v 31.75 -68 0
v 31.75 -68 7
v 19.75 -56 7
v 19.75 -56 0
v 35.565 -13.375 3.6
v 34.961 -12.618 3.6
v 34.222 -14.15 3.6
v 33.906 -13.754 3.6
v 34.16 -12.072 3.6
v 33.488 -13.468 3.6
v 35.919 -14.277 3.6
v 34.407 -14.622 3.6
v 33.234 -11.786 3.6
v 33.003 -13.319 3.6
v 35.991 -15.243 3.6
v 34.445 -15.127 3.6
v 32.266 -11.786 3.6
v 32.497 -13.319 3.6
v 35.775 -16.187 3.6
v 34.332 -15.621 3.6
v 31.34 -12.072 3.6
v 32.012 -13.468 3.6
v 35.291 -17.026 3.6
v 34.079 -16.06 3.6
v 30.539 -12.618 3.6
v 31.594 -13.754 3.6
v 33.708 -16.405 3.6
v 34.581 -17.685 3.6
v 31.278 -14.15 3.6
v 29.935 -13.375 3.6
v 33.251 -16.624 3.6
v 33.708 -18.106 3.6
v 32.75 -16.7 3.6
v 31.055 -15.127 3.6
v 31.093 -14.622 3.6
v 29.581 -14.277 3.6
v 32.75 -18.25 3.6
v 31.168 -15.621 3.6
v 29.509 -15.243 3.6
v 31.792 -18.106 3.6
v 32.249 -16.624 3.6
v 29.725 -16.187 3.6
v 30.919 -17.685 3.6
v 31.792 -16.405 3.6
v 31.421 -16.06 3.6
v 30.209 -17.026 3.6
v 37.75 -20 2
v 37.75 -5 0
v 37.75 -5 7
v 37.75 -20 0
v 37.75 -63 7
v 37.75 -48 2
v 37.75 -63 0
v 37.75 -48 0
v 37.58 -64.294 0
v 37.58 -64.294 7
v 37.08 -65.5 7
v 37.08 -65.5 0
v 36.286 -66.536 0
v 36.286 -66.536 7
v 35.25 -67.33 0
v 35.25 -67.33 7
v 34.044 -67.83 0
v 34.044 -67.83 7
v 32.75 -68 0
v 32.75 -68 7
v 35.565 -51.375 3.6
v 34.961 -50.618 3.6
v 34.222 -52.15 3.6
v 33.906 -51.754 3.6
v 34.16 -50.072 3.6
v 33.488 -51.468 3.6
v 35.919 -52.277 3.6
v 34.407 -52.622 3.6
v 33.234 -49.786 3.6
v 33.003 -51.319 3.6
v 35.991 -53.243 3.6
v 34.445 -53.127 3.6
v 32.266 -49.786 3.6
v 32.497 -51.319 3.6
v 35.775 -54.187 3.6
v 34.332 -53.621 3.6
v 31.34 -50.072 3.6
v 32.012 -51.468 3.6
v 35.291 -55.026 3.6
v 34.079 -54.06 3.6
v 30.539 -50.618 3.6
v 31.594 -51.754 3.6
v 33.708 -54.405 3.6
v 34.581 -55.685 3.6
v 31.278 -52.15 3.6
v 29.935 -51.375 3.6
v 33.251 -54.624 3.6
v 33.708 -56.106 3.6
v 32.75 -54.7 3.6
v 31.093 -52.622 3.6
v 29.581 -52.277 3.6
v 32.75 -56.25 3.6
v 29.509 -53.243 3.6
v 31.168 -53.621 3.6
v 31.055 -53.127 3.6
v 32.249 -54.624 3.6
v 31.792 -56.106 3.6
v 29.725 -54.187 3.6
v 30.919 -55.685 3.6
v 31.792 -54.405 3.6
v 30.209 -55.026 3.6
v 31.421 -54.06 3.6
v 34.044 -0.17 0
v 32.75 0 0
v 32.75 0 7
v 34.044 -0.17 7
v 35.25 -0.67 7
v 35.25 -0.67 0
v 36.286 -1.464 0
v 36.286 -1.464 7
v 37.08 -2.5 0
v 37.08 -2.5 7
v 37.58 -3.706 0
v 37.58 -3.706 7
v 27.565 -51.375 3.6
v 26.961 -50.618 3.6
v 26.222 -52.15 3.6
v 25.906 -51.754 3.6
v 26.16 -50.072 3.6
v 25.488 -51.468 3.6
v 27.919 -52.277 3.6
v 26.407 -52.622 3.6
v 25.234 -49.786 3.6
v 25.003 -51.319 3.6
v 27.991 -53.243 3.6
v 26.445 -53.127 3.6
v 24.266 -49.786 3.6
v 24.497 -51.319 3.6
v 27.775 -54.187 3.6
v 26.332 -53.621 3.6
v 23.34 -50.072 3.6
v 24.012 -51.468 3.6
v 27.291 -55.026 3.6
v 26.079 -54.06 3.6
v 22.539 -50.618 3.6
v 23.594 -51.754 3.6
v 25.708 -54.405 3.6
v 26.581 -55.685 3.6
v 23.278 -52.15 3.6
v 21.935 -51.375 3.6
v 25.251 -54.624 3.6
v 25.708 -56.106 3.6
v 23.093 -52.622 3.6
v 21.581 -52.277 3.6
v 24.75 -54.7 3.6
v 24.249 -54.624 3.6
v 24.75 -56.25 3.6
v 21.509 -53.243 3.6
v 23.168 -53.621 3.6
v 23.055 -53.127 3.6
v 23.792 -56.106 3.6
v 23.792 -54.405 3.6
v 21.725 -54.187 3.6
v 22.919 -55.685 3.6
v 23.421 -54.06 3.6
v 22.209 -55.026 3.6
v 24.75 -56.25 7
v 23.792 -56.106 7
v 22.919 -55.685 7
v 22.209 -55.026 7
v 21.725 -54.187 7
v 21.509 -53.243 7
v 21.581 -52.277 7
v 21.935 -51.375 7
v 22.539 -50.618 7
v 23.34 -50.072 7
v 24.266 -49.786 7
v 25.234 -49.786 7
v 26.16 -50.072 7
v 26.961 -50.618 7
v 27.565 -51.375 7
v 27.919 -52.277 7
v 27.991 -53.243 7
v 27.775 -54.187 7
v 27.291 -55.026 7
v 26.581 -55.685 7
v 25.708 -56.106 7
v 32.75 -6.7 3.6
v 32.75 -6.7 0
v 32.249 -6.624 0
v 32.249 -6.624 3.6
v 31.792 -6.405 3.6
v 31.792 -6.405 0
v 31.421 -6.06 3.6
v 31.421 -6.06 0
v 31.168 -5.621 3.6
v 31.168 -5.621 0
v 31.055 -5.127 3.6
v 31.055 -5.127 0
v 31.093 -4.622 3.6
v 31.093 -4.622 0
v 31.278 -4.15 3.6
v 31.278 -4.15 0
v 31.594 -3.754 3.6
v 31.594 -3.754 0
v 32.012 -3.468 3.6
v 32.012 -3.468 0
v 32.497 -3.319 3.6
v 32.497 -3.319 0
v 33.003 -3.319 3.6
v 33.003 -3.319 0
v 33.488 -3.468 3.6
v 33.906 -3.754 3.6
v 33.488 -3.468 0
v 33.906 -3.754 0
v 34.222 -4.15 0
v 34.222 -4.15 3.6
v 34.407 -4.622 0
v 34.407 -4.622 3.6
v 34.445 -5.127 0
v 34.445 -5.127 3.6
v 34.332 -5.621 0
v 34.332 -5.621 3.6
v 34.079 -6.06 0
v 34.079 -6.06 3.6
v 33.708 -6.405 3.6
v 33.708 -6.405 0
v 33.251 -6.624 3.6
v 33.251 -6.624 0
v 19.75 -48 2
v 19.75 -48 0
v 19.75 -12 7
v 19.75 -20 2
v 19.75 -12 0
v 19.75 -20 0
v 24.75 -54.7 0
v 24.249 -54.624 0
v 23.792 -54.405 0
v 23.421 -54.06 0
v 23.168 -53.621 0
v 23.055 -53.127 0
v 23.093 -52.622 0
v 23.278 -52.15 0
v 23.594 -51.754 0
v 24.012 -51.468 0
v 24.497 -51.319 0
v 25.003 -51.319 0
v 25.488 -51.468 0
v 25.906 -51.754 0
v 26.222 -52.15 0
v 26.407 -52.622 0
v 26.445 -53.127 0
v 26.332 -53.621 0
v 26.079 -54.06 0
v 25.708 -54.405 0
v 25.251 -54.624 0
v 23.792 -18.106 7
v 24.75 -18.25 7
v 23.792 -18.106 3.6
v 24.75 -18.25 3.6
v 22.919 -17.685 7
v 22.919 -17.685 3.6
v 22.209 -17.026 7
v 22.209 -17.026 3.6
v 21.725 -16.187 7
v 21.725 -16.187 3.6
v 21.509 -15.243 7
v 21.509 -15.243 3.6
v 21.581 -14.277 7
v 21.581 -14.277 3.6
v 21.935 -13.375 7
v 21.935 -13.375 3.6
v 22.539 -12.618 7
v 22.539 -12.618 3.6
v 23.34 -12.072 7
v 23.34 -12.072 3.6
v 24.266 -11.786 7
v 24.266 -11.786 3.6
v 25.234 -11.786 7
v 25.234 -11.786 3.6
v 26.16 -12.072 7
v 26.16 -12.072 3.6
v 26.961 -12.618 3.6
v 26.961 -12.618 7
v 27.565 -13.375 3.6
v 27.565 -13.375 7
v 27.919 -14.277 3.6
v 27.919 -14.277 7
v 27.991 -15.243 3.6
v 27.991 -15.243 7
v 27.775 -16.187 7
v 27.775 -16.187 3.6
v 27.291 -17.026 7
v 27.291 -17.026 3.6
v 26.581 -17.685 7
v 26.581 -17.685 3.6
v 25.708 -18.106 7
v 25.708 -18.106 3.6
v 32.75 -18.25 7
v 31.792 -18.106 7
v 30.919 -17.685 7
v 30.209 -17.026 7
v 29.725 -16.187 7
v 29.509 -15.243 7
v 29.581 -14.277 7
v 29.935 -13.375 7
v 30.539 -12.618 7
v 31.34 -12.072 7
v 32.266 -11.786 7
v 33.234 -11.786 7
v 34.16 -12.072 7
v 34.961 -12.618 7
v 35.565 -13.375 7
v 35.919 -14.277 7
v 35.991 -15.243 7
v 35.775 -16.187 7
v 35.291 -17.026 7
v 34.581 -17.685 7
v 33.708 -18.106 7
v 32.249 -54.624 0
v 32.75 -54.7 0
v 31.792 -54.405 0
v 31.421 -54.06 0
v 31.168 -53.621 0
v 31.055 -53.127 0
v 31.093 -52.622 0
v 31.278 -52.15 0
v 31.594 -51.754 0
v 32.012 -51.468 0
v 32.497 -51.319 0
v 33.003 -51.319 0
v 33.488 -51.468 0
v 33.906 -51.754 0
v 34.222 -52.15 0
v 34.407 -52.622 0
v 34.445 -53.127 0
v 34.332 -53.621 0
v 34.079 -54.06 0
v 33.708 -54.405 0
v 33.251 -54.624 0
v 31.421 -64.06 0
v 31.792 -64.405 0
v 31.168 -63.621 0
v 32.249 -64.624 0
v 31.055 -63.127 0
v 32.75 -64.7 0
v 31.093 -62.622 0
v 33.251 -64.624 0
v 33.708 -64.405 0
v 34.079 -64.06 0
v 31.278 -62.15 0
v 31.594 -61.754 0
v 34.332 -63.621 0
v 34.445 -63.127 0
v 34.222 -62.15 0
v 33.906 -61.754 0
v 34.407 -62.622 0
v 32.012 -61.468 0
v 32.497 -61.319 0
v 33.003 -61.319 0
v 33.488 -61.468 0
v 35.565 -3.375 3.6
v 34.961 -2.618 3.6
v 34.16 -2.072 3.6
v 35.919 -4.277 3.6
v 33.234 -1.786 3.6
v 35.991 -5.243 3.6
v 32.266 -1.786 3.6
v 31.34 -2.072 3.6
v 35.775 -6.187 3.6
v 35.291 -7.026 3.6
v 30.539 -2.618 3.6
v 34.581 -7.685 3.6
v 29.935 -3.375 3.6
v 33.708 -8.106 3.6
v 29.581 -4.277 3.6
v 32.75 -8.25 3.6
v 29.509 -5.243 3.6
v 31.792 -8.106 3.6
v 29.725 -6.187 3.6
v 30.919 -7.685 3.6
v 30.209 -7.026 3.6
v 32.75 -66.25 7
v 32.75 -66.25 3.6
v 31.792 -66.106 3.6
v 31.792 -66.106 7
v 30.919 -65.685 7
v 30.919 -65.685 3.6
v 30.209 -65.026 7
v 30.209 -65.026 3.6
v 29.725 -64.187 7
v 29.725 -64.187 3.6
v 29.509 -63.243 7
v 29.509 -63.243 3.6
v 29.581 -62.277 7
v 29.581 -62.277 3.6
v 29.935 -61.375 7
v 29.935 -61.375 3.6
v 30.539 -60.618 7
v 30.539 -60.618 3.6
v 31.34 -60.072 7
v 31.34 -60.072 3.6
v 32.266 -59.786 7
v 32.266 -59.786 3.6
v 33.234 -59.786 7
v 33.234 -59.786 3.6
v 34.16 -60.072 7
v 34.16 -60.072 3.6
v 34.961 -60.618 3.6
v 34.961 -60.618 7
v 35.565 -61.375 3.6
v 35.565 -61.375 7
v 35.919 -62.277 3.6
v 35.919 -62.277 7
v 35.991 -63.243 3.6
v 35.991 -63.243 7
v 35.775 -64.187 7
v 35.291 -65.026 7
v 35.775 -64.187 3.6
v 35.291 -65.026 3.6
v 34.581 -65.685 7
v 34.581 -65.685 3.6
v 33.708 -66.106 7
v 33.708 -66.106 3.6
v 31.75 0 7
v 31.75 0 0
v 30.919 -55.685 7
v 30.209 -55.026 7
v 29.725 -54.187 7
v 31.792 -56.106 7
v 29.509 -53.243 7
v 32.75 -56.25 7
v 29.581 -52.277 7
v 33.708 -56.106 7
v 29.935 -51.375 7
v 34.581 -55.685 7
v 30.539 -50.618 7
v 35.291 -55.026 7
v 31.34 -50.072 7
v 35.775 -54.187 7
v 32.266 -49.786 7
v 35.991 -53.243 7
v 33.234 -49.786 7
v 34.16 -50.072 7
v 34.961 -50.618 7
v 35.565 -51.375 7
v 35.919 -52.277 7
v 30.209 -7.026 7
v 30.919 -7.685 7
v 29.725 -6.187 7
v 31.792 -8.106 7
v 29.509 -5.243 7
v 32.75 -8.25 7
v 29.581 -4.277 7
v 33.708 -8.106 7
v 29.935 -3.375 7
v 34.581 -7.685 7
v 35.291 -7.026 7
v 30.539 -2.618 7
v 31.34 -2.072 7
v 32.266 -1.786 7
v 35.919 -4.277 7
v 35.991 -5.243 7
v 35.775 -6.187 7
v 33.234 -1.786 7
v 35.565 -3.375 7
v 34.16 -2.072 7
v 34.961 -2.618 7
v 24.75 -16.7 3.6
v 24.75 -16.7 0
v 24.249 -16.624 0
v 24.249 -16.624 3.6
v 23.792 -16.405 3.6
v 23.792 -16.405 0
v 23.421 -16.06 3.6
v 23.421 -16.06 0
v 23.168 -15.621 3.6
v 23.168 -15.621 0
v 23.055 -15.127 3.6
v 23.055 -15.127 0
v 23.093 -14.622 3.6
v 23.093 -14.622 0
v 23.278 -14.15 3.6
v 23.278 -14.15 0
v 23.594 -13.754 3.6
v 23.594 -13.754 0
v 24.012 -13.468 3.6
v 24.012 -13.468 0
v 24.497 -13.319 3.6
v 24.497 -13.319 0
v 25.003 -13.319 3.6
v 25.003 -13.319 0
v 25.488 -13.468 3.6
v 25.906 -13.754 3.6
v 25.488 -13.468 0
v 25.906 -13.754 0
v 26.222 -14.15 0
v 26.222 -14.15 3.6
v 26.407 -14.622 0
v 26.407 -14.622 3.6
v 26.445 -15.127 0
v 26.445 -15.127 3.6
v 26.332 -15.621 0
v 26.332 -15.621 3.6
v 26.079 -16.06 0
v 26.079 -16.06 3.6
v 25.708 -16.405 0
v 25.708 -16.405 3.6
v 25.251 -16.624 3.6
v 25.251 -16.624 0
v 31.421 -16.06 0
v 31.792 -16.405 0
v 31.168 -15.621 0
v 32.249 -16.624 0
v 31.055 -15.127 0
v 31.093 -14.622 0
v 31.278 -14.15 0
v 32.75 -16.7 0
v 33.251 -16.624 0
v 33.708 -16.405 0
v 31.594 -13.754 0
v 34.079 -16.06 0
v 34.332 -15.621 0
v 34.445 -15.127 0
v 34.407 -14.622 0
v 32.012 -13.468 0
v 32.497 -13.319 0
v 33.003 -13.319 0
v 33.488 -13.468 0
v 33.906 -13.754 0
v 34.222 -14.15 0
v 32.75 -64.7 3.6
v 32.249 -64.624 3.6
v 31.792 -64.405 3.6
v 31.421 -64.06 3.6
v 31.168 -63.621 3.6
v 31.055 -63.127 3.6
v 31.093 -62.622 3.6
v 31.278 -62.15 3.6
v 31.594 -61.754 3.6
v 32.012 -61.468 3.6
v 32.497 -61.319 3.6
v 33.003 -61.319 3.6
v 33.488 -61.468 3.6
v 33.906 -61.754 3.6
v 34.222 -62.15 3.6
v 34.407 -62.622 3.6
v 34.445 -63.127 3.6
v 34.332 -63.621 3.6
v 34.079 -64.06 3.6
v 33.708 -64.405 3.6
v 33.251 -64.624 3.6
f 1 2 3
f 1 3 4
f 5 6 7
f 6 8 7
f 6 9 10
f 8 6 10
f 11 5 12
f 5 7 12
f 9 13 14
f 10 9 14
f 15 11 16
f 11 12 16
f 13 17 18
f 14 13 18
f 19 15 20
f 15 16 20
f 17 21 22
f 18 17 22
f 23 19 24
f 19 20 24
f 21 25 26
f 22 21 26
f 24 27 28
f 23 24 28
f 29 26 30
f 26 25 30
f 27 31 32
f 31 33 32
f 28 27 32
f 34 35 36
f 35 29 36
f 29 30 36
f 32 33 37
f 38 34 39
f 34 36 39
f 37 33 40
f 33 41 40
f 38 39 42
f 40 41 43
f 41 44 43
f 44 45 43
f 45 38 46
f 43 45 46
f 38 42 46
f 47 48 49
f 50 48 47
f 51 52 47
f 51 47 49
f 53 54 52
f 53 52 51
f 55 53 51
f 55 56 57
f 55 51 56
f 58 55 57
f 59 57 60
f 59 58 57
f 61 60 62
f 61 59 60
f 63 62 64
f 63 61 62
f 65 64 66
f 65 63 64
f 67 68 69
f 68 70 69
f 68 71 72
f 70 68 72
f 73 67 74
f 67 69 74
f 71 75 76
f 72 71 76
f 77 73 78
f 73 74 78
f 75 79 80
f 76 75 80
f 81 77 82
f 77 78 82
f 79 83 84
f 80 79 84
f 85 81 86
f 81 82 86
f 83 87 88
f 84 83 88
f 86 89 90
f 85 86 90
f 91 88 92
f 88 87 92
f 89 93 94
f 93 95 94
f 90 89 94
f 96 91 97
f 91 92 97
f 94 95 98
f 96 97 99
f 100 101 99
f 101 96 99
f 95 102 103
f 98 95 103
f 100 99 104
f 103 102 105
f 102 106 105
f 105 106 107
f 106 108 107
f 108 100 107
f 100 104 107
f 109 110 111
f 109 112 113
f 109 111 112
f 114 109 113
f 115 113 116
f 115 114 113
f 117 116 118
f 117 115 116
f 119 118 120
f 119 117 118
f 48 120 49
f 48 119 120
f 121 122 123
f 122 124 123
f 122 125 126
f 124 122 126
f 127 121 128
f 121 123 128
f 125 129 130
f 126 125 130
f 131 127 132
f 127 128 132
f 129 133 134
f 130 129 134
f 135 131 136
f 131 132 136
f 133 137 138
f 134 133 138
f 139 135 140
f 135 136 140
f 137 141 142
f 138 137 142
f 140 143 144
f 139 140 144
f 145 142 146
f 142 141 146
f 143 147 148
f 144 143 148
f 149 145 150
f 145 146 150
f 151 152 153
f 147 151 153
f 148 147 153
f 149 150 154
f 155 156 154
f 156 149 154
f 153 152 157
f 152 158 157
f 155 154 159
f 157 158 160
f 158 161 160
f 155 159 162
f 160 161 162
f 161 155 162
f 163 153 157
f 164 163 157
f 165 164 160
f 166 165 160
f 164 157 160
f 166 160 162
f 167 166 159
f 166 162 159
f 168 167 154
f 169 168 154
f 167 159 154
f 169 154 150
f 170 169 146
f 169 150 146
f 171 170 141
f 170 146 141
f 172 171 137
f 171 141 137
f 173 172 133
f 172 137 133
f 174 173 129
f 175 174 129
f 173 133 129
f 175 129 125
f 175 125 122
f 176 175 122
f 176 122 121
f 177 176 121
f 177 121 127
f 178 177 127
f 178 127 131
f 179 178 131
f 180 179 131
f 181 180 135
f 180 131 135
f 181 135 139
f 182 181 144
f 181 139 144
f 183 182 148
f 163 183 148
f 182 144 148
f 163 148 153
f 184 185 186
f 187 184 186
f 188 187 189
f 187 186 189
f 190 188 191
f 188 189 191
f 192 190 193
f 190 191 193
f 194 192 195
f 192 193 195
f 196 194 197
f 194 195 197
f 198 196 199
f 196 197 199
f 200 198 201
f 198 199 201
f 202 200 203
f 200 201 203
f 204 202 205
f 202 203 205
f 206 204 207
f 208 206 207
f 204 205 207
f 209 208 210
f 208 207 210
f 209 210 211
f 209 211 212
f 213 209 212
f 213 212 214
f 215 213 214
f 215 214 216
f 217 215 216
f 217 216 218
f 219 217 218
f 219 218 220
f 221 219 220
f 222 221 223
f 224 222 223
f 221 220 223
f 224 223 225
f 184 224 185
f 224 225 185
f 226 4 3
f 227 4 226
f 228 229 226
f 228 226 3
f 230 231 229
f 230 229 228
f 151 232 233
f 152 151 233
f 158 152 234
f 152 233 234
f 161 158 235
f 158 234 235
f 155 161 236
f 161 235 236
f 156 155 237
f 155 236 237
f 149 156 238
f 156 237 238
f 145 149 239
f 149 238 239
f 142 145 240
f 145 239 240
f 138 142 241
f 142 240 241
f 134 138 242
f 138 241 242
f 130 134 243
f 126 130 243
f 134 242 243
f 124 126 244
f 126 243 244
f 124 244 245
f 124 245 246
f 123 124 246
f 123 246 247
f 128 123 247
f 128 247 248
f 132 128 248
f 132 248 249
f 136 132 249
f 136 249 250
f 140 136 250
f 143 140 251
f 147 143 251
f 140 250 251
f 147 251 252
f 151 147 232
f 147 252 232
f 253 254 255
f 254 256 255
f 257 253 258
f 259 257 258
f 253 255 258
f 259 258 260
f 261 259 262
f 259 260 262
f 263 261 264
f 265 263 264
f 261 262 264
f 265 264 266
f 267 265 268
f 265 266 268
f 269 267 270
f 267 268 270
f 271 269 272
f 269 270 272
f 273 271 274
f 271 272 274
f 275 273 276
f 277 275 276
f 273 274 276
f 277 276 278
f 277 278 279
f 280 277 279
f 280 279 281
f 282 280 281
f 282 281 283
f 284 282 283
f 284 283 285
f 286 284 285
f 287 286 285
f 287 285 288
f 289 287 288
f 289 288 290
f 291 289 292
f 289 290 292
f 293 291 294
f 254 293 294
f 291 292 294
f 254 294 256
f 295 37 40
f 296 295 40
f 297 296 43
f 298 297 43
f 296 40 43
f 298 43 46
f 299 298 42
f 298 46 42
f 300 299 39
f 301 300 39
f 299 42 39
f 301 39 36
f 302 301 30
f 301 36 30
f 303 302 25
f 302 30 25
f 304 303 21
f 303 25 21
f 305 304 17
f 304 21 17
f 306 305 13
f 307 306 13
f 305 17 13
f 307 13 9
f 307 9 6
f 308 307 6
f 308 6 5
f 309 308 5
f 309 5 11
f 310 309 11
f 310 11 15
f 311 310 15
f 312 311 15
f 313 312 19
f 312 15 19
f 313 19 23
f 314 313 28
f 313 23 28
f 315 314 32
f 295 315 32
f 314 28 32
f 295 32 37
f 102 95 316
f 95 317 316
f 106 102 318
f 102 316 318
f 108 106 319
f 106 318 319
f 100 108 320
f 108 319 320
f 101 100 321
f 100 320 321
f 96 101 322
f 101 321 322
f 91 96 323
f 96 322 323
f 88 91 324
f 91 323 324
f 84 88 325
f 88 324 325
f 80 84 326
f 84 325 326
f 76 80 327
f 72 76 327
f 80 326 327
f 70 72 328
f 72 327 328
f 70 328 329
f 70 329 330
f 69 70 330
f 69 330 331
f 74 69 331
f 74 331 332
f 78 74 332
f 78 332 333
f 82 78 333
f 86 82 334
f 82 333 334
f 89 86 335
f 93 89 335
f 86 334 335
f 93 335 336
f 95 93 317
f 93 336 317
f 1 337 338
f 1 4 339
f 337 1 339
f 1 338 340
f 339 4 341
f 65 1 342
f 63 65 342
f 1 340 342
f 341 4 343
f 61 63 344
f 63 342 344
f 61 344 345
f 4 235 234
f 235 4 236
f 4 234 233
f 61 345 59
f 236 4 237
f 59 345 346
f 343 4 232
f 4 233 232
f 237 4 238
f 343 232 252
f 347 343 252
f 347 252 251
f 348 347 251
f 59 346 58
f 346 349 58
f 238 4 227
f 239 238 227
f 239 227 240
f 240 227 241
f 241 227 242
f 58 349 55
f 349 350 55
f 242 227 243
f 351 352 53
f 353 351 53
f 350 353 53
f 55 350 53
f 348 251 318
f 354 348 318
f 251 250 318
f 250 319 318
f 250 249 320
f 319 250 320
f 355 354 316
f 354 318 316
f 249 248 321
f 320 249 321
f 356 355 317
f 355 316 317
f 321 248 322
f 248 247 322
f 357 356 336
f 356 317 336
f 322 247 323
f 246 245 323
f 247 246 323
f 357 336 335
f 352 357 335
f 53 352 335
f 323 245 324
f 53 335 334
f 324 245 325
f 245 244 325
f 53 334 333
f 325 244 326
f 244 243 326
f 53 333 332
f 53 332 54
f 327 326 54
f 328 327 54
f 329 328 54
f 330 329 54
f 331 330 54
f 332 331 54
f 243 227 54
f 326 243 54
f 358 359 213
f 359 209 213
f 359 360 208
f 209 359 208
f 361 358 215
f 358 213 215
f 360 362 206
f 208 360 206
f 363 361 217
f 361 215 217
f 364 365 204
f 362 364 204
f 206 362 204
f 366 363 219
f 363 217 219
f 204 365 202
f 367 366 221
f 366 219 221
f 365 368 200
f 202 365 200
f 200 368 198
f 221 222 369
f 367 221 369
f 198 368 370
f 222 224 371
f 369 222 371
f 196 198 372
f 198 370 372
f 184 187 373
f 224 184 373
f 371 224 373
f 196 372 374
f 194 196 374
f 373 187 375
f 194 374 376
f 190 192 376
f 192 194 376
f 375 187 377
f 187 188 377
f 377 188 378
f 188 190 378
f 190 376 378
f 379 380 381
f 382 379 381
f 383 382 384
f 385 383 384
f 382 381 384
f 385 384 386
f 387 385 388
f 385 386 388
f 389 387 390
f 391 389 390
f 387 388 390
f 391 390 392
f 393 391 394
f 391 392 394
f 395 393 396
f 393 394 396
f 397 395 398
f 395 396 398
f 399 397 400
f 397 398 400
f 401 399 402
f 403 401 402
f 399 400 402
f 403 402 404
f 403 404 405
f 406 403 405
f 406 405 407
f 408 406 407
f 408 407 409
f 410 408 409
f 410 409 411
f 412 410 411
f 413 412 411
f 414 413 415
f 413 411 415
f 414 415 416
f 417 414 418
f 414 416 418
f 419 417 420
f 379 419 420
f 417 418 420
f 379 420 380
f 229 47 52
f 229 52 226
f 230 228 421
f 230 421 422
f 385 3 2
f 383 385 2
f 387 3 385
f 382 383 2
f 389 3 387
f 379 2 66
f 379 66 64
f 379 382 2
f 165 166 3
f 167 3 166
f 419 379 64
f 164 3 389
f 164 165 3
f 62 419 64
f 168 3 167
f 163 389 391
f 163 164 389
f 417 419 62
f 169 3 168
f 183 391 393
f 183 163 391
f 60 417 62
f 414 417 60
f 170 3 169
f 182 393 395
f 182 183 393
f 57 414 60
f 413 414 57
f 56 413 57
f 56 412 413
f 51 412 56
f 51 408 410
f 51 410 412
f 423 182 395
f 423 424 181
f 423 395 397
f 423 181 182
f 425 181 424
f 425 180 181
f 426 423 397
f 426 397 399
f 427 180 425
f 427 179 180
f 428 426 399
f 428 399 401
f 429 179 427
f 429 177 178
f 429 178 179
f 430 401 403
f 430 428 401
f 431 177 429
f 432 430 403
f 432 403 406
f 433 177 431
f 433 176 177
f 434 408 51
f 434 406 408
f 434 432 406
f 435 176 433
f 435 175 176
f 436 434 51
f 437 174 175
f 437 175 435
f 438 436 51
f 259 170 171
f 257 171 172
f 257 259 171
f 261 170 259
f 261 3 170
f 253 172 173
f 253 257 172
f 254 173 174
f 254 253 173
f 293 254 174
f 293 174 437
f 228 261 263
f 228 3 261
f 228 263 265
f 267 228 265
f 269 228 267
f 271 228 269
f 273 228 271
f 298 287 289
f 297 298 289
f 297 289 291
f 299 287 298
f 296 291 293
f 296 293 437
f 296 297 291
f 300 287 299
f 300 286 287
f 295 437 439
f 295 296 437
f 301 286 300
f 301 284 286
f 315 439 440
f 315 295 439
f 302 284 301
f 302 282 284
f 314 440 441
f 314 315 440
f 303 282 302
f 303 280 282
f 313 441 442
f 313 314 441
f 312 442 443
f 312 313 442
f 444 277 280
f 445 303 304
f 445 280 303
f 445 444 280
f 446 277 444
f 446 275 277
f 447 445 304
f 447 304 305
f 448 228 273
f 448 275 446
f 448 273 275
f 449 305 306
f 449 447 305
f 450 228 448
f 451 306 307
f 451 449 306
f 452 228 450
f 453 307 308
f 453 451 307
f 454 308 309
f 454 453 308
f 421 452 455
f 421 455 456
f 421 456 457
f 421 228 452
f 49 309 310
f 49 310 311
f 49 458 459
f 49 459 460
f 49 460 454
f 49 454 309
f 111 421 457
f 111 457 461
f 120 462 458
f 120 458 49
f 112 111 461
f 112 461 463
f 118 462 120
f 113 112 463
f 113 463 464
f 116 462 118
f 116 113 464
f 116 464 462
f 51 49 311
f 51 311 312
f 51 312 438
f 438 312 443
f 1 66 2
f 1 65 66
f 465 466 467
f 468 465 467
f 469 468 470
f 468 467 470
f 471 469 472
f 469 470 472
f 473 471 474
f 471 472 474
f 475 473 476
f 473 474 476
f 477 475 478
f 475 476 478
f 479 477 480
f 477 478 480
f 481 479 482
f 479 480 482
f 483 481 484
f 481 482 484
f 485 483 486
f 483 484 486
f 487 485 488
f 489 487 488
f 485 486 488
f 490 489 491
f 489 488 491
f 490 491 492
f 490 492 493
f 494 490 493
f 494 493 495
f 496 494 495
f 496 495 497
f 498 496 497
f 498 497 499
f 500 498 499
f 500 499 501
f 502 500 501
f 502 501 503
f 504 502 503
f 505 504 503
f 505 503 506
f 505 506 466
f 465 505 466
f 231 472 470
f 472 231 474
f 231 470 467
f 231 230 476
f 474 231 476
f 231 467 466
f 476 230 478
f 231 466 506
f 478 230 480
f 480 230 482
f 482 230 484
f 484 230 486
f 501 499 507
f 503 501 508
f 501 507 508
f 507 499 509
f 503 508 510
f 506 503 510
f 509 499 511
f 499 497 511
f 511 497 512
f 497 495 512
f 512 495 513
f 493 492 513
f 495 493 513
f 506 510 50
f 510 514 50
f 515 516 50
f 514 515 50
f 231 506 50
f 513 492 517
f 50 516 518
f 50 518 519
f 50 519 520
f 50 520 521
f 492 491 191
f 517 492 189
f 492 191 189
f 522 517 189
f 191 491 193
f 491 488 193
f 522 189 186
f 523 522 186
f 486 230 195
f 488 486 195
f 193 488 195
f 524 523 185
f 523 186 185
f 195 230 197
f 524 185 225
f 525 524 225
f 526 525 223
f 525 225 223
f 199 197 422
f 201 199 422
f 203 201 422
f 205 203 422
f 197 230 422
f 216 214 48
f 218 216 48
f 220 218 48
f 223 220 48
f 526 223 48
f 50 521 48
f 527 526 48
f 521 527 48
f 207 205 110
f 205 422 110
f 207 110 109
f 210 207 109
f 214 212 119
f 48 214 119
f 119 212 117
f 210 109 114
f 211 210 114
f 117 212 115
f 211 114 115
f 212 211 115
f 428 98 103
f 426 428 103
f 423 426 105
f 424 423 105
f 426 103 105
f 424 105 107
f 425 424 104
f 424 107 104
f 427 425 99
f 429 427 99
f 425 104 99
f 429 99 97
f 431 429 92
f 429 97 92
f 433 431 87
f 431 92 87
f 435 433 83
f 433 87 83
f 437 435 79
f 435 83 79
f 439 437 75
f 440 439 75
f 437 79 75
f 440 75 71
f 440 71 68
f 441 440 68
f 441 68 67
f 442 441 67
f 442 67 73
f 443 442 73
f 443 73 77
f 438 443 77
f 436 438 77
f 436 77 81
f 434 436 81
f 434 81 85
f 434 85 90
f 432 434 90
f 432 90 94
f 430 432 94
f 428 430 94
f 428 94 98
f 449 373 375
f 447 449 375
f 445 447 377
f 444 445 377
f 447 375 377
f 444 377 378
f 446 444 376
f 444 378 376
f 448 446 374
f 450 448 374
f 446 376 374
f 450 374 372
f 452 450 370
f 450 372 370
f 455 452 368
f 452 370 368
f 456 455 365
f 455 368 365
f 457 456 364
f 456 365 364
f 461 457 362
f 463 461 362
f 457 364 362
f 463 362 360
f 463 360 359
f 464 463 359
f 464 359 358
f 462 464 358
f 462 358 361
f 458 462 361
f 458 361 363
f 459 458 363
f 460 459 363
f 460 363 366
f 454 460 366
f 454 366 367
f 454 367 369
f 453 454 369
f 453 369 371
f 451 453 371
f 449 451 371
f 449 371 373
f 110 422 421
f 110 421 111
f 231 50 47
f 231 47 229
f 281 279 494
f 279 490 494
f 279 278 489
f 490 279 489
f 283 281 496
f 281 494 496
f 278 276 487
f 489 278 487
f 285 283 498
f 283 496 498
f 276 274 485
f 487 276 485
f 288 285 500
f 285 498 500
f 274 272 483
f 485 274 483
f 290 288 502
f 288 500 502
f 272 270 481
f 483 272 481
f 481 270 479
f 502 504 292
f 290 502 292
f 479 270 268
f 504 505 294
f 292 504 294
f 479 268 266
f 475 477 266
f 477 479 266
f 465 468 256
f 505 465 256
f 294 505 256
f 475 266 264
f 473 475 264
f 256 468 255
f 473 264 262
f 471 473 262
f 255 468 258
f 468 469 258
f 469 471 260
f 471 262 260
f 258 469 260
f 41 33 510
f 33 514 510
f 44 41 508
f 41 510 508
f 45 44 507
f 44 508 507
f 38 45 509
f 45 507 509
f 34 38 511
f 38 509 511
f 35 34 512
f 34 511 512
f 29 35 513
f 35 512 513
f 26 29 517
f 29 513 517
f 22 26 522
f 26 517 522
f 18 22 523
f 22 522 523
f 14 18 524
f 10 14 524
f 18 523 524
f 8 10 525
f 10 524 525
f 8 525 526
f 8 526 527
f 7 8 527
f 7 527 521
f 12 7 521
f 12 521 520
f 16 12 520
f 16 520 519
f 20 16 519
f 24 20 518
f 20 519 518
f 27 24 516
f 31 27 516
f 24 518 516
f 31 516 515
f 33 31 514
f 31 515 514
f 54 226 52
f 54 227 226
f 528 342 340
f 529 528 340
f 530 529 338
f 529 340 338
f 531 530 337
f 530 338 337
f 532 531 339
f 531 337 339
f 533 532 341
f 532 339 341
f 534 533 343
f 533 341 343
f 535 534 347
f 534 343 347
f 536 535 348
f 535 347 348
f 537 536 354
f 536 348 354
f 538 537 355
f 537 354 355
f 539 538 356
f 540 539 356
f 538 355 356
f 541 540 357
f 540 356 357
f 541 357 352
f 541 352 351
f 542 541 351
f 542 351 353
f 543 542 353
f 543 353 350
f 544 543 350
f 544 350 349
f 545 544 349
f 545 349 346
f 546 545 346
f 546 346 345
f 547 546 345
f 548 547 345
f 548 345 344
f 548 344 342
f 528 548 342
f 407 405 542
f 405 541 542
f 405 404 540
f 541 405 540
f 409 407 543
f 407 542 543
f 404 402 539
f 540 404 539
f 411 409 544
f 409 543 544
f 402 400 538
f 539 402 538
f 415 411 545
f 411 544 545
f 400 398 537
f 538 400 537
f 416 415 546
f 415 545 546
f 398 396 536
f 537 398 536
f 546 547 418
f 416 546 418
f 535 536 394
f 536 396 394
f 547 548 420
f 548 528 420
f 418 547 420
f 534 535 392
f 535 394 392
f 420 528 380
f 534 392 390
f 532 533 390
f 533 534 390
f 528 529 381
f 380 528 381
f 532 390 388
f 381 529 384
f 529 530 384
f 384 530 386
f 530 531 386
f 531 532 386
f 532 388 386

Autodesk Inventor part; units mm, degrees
ref_plane "YZ Plane" through (0, 0, 0) normal (1, 0, 0) x (0, 1, 0)
ref_plane "XZ Plane" through (0, 0, 0) normal (0, 1, 0) x (-1, 0, 0)
ref_plane "XY Plane" through (0, 0, 0) normal (0, 0, 1) x (1, 0, 0)
ref_plane "Work Plane1" through (0, 0, 0) normal (0, 0, 1) x (1, 0, 0)
sketch "Sketch1" plane through (0, 0, 0) normal (0, 0, 1) x (1, 0, 0)
  line L0 (-32.75, 0) -> (32.75, 0) projected
  arc A0 (37.75, -5) -> (32.75, 0) centre (32.75, -5) ccw projected
  line L1 (37.75, -5) -> (37.75, -15) projected
  line L2 (-37.75, -20) -> (77.75, -20) construction
  line L3 (0.95, -48) -> (37.75, -48) construction
  arc A1 (32.75, -68) -> (37.75, -63) centre (32.75, -63) ccw projected
  line L4 (37.75, -63) -> (37.75, -48) projected
  line L5 (26.6, -68) -> (32.75, -68) projected
  line L6 (19.75, 0) -> (37.75, 0)
  line L7 (37.75, 0) -> (37.75, -68)
  line L8 (37.75, -68) -> (19.75, -68)
  line L9 (19.75, -68) -> (19.75, 0)
  point P0 (0, 0)
  point P1 (24.75, -5)
  point P2 (24.75, -63)
  dimension "d0" = 18
  dimension "d1" = 5
  dimension "d2" = 5
  dimension "d3" = 5
extrude "Extrusion1" add sketch "Sketch1" along normal blind 7 contours L0 A0 L1 L7 L4 A1 L5 L8 L9
sketch "Sketch2" plane through (0, 0, 0) normal (0, 0, -1) x (-1, 0, 0)
  line L0 (37.75, -20) -> (-77.75, -20) construction
  line L1 (-0.95, -48) -> (-37.75, -48) projected
  line L2 (-19.75, 0) -> (-19.75, -68) projected
  line L3 (-37.75, -63) -> (-37.75, -5) projected
  line L4 (-19.75, -48) -> (-37.75, -48)
  line L5 (-37.75, -48) -> (-37.75, -20)
  line L6 (-37.75, -20) -> (-19.75, -20)
  line L7 (-19.75, -20) -> (-19.75, -48)
  point P0 (0, 0)
  point P1 (-19.75, -20)
extrude "Extrusion2" cut sketch "Sketch2" against normal blind 2
sketch "Sketch3" plane through (0, 0, 7) normal (0, 0, 1) x (1, 0, 0)
  line L0 (19.75, -68) -> (32.75, -68) projected
  arc A0 (32.75, -68) -> (37.75, -63) centre (32.75, -63) ccw projected
  line L1 (37.75, -63) -> (37.75, -5) projected
  arc A1 (37.75, -5) -> (32.75, 0) centre (32.75, -5) ccw projected
  line L2 (32.75, 0) -> (19.75, 0) projected
  line L3 (19.75, 0) -> (19.75, -68) projected
  line L4 (37.75, -34) -> (19.75, -34) construction
  line L5 (28.75, -34) -> (28.75, -68) construction
  line L6 (19.75, -68) -> (32.75, -68) projected
  line L7 (-37.75, -20) -> (77.75, -20) construction
  line L8 (0.95, -48) -> (37.75, -48) projected
  line L9 (77.75, -15) -> (37.75, -15) projected
  point P0 (0, 0)
  point P1 (32.75, -63)
  point P2 (32.75, -15)
  point P3 (32.75, -53)
  point P4 (24.75, -15)
  point P5 (24.75, -53)
  dimension "d15" = 5
  dimension "d16" = 5
  dimension "d22" = 5
  dimension "d23" = 5
hole "Hole1" at (32.75, -5, 7) at (32.75, -63, 7) at (32.75, -15, 7) at (24.75, -15, 7) at (24.75, -53, 7) at (32.75, -53, 7) direction (0, 0, -1) diameter 3.4 depth 7 counterbore diameter 6.5 counterbore depth 3.4 clearance for "Socket Head Cap Screw DIN EN ISO 4762" size "M3" standard "DIN"
chamfer "Chamfer1" distance 12 angle 45 2 edges at (19.75, -68, 3.5) (19.75, 0, 3.5)
equation "\"d2\" = d1"
equation "\"d3\" = d1"
equation "\"d16\" = d15"
properties part number "SideBrace"
